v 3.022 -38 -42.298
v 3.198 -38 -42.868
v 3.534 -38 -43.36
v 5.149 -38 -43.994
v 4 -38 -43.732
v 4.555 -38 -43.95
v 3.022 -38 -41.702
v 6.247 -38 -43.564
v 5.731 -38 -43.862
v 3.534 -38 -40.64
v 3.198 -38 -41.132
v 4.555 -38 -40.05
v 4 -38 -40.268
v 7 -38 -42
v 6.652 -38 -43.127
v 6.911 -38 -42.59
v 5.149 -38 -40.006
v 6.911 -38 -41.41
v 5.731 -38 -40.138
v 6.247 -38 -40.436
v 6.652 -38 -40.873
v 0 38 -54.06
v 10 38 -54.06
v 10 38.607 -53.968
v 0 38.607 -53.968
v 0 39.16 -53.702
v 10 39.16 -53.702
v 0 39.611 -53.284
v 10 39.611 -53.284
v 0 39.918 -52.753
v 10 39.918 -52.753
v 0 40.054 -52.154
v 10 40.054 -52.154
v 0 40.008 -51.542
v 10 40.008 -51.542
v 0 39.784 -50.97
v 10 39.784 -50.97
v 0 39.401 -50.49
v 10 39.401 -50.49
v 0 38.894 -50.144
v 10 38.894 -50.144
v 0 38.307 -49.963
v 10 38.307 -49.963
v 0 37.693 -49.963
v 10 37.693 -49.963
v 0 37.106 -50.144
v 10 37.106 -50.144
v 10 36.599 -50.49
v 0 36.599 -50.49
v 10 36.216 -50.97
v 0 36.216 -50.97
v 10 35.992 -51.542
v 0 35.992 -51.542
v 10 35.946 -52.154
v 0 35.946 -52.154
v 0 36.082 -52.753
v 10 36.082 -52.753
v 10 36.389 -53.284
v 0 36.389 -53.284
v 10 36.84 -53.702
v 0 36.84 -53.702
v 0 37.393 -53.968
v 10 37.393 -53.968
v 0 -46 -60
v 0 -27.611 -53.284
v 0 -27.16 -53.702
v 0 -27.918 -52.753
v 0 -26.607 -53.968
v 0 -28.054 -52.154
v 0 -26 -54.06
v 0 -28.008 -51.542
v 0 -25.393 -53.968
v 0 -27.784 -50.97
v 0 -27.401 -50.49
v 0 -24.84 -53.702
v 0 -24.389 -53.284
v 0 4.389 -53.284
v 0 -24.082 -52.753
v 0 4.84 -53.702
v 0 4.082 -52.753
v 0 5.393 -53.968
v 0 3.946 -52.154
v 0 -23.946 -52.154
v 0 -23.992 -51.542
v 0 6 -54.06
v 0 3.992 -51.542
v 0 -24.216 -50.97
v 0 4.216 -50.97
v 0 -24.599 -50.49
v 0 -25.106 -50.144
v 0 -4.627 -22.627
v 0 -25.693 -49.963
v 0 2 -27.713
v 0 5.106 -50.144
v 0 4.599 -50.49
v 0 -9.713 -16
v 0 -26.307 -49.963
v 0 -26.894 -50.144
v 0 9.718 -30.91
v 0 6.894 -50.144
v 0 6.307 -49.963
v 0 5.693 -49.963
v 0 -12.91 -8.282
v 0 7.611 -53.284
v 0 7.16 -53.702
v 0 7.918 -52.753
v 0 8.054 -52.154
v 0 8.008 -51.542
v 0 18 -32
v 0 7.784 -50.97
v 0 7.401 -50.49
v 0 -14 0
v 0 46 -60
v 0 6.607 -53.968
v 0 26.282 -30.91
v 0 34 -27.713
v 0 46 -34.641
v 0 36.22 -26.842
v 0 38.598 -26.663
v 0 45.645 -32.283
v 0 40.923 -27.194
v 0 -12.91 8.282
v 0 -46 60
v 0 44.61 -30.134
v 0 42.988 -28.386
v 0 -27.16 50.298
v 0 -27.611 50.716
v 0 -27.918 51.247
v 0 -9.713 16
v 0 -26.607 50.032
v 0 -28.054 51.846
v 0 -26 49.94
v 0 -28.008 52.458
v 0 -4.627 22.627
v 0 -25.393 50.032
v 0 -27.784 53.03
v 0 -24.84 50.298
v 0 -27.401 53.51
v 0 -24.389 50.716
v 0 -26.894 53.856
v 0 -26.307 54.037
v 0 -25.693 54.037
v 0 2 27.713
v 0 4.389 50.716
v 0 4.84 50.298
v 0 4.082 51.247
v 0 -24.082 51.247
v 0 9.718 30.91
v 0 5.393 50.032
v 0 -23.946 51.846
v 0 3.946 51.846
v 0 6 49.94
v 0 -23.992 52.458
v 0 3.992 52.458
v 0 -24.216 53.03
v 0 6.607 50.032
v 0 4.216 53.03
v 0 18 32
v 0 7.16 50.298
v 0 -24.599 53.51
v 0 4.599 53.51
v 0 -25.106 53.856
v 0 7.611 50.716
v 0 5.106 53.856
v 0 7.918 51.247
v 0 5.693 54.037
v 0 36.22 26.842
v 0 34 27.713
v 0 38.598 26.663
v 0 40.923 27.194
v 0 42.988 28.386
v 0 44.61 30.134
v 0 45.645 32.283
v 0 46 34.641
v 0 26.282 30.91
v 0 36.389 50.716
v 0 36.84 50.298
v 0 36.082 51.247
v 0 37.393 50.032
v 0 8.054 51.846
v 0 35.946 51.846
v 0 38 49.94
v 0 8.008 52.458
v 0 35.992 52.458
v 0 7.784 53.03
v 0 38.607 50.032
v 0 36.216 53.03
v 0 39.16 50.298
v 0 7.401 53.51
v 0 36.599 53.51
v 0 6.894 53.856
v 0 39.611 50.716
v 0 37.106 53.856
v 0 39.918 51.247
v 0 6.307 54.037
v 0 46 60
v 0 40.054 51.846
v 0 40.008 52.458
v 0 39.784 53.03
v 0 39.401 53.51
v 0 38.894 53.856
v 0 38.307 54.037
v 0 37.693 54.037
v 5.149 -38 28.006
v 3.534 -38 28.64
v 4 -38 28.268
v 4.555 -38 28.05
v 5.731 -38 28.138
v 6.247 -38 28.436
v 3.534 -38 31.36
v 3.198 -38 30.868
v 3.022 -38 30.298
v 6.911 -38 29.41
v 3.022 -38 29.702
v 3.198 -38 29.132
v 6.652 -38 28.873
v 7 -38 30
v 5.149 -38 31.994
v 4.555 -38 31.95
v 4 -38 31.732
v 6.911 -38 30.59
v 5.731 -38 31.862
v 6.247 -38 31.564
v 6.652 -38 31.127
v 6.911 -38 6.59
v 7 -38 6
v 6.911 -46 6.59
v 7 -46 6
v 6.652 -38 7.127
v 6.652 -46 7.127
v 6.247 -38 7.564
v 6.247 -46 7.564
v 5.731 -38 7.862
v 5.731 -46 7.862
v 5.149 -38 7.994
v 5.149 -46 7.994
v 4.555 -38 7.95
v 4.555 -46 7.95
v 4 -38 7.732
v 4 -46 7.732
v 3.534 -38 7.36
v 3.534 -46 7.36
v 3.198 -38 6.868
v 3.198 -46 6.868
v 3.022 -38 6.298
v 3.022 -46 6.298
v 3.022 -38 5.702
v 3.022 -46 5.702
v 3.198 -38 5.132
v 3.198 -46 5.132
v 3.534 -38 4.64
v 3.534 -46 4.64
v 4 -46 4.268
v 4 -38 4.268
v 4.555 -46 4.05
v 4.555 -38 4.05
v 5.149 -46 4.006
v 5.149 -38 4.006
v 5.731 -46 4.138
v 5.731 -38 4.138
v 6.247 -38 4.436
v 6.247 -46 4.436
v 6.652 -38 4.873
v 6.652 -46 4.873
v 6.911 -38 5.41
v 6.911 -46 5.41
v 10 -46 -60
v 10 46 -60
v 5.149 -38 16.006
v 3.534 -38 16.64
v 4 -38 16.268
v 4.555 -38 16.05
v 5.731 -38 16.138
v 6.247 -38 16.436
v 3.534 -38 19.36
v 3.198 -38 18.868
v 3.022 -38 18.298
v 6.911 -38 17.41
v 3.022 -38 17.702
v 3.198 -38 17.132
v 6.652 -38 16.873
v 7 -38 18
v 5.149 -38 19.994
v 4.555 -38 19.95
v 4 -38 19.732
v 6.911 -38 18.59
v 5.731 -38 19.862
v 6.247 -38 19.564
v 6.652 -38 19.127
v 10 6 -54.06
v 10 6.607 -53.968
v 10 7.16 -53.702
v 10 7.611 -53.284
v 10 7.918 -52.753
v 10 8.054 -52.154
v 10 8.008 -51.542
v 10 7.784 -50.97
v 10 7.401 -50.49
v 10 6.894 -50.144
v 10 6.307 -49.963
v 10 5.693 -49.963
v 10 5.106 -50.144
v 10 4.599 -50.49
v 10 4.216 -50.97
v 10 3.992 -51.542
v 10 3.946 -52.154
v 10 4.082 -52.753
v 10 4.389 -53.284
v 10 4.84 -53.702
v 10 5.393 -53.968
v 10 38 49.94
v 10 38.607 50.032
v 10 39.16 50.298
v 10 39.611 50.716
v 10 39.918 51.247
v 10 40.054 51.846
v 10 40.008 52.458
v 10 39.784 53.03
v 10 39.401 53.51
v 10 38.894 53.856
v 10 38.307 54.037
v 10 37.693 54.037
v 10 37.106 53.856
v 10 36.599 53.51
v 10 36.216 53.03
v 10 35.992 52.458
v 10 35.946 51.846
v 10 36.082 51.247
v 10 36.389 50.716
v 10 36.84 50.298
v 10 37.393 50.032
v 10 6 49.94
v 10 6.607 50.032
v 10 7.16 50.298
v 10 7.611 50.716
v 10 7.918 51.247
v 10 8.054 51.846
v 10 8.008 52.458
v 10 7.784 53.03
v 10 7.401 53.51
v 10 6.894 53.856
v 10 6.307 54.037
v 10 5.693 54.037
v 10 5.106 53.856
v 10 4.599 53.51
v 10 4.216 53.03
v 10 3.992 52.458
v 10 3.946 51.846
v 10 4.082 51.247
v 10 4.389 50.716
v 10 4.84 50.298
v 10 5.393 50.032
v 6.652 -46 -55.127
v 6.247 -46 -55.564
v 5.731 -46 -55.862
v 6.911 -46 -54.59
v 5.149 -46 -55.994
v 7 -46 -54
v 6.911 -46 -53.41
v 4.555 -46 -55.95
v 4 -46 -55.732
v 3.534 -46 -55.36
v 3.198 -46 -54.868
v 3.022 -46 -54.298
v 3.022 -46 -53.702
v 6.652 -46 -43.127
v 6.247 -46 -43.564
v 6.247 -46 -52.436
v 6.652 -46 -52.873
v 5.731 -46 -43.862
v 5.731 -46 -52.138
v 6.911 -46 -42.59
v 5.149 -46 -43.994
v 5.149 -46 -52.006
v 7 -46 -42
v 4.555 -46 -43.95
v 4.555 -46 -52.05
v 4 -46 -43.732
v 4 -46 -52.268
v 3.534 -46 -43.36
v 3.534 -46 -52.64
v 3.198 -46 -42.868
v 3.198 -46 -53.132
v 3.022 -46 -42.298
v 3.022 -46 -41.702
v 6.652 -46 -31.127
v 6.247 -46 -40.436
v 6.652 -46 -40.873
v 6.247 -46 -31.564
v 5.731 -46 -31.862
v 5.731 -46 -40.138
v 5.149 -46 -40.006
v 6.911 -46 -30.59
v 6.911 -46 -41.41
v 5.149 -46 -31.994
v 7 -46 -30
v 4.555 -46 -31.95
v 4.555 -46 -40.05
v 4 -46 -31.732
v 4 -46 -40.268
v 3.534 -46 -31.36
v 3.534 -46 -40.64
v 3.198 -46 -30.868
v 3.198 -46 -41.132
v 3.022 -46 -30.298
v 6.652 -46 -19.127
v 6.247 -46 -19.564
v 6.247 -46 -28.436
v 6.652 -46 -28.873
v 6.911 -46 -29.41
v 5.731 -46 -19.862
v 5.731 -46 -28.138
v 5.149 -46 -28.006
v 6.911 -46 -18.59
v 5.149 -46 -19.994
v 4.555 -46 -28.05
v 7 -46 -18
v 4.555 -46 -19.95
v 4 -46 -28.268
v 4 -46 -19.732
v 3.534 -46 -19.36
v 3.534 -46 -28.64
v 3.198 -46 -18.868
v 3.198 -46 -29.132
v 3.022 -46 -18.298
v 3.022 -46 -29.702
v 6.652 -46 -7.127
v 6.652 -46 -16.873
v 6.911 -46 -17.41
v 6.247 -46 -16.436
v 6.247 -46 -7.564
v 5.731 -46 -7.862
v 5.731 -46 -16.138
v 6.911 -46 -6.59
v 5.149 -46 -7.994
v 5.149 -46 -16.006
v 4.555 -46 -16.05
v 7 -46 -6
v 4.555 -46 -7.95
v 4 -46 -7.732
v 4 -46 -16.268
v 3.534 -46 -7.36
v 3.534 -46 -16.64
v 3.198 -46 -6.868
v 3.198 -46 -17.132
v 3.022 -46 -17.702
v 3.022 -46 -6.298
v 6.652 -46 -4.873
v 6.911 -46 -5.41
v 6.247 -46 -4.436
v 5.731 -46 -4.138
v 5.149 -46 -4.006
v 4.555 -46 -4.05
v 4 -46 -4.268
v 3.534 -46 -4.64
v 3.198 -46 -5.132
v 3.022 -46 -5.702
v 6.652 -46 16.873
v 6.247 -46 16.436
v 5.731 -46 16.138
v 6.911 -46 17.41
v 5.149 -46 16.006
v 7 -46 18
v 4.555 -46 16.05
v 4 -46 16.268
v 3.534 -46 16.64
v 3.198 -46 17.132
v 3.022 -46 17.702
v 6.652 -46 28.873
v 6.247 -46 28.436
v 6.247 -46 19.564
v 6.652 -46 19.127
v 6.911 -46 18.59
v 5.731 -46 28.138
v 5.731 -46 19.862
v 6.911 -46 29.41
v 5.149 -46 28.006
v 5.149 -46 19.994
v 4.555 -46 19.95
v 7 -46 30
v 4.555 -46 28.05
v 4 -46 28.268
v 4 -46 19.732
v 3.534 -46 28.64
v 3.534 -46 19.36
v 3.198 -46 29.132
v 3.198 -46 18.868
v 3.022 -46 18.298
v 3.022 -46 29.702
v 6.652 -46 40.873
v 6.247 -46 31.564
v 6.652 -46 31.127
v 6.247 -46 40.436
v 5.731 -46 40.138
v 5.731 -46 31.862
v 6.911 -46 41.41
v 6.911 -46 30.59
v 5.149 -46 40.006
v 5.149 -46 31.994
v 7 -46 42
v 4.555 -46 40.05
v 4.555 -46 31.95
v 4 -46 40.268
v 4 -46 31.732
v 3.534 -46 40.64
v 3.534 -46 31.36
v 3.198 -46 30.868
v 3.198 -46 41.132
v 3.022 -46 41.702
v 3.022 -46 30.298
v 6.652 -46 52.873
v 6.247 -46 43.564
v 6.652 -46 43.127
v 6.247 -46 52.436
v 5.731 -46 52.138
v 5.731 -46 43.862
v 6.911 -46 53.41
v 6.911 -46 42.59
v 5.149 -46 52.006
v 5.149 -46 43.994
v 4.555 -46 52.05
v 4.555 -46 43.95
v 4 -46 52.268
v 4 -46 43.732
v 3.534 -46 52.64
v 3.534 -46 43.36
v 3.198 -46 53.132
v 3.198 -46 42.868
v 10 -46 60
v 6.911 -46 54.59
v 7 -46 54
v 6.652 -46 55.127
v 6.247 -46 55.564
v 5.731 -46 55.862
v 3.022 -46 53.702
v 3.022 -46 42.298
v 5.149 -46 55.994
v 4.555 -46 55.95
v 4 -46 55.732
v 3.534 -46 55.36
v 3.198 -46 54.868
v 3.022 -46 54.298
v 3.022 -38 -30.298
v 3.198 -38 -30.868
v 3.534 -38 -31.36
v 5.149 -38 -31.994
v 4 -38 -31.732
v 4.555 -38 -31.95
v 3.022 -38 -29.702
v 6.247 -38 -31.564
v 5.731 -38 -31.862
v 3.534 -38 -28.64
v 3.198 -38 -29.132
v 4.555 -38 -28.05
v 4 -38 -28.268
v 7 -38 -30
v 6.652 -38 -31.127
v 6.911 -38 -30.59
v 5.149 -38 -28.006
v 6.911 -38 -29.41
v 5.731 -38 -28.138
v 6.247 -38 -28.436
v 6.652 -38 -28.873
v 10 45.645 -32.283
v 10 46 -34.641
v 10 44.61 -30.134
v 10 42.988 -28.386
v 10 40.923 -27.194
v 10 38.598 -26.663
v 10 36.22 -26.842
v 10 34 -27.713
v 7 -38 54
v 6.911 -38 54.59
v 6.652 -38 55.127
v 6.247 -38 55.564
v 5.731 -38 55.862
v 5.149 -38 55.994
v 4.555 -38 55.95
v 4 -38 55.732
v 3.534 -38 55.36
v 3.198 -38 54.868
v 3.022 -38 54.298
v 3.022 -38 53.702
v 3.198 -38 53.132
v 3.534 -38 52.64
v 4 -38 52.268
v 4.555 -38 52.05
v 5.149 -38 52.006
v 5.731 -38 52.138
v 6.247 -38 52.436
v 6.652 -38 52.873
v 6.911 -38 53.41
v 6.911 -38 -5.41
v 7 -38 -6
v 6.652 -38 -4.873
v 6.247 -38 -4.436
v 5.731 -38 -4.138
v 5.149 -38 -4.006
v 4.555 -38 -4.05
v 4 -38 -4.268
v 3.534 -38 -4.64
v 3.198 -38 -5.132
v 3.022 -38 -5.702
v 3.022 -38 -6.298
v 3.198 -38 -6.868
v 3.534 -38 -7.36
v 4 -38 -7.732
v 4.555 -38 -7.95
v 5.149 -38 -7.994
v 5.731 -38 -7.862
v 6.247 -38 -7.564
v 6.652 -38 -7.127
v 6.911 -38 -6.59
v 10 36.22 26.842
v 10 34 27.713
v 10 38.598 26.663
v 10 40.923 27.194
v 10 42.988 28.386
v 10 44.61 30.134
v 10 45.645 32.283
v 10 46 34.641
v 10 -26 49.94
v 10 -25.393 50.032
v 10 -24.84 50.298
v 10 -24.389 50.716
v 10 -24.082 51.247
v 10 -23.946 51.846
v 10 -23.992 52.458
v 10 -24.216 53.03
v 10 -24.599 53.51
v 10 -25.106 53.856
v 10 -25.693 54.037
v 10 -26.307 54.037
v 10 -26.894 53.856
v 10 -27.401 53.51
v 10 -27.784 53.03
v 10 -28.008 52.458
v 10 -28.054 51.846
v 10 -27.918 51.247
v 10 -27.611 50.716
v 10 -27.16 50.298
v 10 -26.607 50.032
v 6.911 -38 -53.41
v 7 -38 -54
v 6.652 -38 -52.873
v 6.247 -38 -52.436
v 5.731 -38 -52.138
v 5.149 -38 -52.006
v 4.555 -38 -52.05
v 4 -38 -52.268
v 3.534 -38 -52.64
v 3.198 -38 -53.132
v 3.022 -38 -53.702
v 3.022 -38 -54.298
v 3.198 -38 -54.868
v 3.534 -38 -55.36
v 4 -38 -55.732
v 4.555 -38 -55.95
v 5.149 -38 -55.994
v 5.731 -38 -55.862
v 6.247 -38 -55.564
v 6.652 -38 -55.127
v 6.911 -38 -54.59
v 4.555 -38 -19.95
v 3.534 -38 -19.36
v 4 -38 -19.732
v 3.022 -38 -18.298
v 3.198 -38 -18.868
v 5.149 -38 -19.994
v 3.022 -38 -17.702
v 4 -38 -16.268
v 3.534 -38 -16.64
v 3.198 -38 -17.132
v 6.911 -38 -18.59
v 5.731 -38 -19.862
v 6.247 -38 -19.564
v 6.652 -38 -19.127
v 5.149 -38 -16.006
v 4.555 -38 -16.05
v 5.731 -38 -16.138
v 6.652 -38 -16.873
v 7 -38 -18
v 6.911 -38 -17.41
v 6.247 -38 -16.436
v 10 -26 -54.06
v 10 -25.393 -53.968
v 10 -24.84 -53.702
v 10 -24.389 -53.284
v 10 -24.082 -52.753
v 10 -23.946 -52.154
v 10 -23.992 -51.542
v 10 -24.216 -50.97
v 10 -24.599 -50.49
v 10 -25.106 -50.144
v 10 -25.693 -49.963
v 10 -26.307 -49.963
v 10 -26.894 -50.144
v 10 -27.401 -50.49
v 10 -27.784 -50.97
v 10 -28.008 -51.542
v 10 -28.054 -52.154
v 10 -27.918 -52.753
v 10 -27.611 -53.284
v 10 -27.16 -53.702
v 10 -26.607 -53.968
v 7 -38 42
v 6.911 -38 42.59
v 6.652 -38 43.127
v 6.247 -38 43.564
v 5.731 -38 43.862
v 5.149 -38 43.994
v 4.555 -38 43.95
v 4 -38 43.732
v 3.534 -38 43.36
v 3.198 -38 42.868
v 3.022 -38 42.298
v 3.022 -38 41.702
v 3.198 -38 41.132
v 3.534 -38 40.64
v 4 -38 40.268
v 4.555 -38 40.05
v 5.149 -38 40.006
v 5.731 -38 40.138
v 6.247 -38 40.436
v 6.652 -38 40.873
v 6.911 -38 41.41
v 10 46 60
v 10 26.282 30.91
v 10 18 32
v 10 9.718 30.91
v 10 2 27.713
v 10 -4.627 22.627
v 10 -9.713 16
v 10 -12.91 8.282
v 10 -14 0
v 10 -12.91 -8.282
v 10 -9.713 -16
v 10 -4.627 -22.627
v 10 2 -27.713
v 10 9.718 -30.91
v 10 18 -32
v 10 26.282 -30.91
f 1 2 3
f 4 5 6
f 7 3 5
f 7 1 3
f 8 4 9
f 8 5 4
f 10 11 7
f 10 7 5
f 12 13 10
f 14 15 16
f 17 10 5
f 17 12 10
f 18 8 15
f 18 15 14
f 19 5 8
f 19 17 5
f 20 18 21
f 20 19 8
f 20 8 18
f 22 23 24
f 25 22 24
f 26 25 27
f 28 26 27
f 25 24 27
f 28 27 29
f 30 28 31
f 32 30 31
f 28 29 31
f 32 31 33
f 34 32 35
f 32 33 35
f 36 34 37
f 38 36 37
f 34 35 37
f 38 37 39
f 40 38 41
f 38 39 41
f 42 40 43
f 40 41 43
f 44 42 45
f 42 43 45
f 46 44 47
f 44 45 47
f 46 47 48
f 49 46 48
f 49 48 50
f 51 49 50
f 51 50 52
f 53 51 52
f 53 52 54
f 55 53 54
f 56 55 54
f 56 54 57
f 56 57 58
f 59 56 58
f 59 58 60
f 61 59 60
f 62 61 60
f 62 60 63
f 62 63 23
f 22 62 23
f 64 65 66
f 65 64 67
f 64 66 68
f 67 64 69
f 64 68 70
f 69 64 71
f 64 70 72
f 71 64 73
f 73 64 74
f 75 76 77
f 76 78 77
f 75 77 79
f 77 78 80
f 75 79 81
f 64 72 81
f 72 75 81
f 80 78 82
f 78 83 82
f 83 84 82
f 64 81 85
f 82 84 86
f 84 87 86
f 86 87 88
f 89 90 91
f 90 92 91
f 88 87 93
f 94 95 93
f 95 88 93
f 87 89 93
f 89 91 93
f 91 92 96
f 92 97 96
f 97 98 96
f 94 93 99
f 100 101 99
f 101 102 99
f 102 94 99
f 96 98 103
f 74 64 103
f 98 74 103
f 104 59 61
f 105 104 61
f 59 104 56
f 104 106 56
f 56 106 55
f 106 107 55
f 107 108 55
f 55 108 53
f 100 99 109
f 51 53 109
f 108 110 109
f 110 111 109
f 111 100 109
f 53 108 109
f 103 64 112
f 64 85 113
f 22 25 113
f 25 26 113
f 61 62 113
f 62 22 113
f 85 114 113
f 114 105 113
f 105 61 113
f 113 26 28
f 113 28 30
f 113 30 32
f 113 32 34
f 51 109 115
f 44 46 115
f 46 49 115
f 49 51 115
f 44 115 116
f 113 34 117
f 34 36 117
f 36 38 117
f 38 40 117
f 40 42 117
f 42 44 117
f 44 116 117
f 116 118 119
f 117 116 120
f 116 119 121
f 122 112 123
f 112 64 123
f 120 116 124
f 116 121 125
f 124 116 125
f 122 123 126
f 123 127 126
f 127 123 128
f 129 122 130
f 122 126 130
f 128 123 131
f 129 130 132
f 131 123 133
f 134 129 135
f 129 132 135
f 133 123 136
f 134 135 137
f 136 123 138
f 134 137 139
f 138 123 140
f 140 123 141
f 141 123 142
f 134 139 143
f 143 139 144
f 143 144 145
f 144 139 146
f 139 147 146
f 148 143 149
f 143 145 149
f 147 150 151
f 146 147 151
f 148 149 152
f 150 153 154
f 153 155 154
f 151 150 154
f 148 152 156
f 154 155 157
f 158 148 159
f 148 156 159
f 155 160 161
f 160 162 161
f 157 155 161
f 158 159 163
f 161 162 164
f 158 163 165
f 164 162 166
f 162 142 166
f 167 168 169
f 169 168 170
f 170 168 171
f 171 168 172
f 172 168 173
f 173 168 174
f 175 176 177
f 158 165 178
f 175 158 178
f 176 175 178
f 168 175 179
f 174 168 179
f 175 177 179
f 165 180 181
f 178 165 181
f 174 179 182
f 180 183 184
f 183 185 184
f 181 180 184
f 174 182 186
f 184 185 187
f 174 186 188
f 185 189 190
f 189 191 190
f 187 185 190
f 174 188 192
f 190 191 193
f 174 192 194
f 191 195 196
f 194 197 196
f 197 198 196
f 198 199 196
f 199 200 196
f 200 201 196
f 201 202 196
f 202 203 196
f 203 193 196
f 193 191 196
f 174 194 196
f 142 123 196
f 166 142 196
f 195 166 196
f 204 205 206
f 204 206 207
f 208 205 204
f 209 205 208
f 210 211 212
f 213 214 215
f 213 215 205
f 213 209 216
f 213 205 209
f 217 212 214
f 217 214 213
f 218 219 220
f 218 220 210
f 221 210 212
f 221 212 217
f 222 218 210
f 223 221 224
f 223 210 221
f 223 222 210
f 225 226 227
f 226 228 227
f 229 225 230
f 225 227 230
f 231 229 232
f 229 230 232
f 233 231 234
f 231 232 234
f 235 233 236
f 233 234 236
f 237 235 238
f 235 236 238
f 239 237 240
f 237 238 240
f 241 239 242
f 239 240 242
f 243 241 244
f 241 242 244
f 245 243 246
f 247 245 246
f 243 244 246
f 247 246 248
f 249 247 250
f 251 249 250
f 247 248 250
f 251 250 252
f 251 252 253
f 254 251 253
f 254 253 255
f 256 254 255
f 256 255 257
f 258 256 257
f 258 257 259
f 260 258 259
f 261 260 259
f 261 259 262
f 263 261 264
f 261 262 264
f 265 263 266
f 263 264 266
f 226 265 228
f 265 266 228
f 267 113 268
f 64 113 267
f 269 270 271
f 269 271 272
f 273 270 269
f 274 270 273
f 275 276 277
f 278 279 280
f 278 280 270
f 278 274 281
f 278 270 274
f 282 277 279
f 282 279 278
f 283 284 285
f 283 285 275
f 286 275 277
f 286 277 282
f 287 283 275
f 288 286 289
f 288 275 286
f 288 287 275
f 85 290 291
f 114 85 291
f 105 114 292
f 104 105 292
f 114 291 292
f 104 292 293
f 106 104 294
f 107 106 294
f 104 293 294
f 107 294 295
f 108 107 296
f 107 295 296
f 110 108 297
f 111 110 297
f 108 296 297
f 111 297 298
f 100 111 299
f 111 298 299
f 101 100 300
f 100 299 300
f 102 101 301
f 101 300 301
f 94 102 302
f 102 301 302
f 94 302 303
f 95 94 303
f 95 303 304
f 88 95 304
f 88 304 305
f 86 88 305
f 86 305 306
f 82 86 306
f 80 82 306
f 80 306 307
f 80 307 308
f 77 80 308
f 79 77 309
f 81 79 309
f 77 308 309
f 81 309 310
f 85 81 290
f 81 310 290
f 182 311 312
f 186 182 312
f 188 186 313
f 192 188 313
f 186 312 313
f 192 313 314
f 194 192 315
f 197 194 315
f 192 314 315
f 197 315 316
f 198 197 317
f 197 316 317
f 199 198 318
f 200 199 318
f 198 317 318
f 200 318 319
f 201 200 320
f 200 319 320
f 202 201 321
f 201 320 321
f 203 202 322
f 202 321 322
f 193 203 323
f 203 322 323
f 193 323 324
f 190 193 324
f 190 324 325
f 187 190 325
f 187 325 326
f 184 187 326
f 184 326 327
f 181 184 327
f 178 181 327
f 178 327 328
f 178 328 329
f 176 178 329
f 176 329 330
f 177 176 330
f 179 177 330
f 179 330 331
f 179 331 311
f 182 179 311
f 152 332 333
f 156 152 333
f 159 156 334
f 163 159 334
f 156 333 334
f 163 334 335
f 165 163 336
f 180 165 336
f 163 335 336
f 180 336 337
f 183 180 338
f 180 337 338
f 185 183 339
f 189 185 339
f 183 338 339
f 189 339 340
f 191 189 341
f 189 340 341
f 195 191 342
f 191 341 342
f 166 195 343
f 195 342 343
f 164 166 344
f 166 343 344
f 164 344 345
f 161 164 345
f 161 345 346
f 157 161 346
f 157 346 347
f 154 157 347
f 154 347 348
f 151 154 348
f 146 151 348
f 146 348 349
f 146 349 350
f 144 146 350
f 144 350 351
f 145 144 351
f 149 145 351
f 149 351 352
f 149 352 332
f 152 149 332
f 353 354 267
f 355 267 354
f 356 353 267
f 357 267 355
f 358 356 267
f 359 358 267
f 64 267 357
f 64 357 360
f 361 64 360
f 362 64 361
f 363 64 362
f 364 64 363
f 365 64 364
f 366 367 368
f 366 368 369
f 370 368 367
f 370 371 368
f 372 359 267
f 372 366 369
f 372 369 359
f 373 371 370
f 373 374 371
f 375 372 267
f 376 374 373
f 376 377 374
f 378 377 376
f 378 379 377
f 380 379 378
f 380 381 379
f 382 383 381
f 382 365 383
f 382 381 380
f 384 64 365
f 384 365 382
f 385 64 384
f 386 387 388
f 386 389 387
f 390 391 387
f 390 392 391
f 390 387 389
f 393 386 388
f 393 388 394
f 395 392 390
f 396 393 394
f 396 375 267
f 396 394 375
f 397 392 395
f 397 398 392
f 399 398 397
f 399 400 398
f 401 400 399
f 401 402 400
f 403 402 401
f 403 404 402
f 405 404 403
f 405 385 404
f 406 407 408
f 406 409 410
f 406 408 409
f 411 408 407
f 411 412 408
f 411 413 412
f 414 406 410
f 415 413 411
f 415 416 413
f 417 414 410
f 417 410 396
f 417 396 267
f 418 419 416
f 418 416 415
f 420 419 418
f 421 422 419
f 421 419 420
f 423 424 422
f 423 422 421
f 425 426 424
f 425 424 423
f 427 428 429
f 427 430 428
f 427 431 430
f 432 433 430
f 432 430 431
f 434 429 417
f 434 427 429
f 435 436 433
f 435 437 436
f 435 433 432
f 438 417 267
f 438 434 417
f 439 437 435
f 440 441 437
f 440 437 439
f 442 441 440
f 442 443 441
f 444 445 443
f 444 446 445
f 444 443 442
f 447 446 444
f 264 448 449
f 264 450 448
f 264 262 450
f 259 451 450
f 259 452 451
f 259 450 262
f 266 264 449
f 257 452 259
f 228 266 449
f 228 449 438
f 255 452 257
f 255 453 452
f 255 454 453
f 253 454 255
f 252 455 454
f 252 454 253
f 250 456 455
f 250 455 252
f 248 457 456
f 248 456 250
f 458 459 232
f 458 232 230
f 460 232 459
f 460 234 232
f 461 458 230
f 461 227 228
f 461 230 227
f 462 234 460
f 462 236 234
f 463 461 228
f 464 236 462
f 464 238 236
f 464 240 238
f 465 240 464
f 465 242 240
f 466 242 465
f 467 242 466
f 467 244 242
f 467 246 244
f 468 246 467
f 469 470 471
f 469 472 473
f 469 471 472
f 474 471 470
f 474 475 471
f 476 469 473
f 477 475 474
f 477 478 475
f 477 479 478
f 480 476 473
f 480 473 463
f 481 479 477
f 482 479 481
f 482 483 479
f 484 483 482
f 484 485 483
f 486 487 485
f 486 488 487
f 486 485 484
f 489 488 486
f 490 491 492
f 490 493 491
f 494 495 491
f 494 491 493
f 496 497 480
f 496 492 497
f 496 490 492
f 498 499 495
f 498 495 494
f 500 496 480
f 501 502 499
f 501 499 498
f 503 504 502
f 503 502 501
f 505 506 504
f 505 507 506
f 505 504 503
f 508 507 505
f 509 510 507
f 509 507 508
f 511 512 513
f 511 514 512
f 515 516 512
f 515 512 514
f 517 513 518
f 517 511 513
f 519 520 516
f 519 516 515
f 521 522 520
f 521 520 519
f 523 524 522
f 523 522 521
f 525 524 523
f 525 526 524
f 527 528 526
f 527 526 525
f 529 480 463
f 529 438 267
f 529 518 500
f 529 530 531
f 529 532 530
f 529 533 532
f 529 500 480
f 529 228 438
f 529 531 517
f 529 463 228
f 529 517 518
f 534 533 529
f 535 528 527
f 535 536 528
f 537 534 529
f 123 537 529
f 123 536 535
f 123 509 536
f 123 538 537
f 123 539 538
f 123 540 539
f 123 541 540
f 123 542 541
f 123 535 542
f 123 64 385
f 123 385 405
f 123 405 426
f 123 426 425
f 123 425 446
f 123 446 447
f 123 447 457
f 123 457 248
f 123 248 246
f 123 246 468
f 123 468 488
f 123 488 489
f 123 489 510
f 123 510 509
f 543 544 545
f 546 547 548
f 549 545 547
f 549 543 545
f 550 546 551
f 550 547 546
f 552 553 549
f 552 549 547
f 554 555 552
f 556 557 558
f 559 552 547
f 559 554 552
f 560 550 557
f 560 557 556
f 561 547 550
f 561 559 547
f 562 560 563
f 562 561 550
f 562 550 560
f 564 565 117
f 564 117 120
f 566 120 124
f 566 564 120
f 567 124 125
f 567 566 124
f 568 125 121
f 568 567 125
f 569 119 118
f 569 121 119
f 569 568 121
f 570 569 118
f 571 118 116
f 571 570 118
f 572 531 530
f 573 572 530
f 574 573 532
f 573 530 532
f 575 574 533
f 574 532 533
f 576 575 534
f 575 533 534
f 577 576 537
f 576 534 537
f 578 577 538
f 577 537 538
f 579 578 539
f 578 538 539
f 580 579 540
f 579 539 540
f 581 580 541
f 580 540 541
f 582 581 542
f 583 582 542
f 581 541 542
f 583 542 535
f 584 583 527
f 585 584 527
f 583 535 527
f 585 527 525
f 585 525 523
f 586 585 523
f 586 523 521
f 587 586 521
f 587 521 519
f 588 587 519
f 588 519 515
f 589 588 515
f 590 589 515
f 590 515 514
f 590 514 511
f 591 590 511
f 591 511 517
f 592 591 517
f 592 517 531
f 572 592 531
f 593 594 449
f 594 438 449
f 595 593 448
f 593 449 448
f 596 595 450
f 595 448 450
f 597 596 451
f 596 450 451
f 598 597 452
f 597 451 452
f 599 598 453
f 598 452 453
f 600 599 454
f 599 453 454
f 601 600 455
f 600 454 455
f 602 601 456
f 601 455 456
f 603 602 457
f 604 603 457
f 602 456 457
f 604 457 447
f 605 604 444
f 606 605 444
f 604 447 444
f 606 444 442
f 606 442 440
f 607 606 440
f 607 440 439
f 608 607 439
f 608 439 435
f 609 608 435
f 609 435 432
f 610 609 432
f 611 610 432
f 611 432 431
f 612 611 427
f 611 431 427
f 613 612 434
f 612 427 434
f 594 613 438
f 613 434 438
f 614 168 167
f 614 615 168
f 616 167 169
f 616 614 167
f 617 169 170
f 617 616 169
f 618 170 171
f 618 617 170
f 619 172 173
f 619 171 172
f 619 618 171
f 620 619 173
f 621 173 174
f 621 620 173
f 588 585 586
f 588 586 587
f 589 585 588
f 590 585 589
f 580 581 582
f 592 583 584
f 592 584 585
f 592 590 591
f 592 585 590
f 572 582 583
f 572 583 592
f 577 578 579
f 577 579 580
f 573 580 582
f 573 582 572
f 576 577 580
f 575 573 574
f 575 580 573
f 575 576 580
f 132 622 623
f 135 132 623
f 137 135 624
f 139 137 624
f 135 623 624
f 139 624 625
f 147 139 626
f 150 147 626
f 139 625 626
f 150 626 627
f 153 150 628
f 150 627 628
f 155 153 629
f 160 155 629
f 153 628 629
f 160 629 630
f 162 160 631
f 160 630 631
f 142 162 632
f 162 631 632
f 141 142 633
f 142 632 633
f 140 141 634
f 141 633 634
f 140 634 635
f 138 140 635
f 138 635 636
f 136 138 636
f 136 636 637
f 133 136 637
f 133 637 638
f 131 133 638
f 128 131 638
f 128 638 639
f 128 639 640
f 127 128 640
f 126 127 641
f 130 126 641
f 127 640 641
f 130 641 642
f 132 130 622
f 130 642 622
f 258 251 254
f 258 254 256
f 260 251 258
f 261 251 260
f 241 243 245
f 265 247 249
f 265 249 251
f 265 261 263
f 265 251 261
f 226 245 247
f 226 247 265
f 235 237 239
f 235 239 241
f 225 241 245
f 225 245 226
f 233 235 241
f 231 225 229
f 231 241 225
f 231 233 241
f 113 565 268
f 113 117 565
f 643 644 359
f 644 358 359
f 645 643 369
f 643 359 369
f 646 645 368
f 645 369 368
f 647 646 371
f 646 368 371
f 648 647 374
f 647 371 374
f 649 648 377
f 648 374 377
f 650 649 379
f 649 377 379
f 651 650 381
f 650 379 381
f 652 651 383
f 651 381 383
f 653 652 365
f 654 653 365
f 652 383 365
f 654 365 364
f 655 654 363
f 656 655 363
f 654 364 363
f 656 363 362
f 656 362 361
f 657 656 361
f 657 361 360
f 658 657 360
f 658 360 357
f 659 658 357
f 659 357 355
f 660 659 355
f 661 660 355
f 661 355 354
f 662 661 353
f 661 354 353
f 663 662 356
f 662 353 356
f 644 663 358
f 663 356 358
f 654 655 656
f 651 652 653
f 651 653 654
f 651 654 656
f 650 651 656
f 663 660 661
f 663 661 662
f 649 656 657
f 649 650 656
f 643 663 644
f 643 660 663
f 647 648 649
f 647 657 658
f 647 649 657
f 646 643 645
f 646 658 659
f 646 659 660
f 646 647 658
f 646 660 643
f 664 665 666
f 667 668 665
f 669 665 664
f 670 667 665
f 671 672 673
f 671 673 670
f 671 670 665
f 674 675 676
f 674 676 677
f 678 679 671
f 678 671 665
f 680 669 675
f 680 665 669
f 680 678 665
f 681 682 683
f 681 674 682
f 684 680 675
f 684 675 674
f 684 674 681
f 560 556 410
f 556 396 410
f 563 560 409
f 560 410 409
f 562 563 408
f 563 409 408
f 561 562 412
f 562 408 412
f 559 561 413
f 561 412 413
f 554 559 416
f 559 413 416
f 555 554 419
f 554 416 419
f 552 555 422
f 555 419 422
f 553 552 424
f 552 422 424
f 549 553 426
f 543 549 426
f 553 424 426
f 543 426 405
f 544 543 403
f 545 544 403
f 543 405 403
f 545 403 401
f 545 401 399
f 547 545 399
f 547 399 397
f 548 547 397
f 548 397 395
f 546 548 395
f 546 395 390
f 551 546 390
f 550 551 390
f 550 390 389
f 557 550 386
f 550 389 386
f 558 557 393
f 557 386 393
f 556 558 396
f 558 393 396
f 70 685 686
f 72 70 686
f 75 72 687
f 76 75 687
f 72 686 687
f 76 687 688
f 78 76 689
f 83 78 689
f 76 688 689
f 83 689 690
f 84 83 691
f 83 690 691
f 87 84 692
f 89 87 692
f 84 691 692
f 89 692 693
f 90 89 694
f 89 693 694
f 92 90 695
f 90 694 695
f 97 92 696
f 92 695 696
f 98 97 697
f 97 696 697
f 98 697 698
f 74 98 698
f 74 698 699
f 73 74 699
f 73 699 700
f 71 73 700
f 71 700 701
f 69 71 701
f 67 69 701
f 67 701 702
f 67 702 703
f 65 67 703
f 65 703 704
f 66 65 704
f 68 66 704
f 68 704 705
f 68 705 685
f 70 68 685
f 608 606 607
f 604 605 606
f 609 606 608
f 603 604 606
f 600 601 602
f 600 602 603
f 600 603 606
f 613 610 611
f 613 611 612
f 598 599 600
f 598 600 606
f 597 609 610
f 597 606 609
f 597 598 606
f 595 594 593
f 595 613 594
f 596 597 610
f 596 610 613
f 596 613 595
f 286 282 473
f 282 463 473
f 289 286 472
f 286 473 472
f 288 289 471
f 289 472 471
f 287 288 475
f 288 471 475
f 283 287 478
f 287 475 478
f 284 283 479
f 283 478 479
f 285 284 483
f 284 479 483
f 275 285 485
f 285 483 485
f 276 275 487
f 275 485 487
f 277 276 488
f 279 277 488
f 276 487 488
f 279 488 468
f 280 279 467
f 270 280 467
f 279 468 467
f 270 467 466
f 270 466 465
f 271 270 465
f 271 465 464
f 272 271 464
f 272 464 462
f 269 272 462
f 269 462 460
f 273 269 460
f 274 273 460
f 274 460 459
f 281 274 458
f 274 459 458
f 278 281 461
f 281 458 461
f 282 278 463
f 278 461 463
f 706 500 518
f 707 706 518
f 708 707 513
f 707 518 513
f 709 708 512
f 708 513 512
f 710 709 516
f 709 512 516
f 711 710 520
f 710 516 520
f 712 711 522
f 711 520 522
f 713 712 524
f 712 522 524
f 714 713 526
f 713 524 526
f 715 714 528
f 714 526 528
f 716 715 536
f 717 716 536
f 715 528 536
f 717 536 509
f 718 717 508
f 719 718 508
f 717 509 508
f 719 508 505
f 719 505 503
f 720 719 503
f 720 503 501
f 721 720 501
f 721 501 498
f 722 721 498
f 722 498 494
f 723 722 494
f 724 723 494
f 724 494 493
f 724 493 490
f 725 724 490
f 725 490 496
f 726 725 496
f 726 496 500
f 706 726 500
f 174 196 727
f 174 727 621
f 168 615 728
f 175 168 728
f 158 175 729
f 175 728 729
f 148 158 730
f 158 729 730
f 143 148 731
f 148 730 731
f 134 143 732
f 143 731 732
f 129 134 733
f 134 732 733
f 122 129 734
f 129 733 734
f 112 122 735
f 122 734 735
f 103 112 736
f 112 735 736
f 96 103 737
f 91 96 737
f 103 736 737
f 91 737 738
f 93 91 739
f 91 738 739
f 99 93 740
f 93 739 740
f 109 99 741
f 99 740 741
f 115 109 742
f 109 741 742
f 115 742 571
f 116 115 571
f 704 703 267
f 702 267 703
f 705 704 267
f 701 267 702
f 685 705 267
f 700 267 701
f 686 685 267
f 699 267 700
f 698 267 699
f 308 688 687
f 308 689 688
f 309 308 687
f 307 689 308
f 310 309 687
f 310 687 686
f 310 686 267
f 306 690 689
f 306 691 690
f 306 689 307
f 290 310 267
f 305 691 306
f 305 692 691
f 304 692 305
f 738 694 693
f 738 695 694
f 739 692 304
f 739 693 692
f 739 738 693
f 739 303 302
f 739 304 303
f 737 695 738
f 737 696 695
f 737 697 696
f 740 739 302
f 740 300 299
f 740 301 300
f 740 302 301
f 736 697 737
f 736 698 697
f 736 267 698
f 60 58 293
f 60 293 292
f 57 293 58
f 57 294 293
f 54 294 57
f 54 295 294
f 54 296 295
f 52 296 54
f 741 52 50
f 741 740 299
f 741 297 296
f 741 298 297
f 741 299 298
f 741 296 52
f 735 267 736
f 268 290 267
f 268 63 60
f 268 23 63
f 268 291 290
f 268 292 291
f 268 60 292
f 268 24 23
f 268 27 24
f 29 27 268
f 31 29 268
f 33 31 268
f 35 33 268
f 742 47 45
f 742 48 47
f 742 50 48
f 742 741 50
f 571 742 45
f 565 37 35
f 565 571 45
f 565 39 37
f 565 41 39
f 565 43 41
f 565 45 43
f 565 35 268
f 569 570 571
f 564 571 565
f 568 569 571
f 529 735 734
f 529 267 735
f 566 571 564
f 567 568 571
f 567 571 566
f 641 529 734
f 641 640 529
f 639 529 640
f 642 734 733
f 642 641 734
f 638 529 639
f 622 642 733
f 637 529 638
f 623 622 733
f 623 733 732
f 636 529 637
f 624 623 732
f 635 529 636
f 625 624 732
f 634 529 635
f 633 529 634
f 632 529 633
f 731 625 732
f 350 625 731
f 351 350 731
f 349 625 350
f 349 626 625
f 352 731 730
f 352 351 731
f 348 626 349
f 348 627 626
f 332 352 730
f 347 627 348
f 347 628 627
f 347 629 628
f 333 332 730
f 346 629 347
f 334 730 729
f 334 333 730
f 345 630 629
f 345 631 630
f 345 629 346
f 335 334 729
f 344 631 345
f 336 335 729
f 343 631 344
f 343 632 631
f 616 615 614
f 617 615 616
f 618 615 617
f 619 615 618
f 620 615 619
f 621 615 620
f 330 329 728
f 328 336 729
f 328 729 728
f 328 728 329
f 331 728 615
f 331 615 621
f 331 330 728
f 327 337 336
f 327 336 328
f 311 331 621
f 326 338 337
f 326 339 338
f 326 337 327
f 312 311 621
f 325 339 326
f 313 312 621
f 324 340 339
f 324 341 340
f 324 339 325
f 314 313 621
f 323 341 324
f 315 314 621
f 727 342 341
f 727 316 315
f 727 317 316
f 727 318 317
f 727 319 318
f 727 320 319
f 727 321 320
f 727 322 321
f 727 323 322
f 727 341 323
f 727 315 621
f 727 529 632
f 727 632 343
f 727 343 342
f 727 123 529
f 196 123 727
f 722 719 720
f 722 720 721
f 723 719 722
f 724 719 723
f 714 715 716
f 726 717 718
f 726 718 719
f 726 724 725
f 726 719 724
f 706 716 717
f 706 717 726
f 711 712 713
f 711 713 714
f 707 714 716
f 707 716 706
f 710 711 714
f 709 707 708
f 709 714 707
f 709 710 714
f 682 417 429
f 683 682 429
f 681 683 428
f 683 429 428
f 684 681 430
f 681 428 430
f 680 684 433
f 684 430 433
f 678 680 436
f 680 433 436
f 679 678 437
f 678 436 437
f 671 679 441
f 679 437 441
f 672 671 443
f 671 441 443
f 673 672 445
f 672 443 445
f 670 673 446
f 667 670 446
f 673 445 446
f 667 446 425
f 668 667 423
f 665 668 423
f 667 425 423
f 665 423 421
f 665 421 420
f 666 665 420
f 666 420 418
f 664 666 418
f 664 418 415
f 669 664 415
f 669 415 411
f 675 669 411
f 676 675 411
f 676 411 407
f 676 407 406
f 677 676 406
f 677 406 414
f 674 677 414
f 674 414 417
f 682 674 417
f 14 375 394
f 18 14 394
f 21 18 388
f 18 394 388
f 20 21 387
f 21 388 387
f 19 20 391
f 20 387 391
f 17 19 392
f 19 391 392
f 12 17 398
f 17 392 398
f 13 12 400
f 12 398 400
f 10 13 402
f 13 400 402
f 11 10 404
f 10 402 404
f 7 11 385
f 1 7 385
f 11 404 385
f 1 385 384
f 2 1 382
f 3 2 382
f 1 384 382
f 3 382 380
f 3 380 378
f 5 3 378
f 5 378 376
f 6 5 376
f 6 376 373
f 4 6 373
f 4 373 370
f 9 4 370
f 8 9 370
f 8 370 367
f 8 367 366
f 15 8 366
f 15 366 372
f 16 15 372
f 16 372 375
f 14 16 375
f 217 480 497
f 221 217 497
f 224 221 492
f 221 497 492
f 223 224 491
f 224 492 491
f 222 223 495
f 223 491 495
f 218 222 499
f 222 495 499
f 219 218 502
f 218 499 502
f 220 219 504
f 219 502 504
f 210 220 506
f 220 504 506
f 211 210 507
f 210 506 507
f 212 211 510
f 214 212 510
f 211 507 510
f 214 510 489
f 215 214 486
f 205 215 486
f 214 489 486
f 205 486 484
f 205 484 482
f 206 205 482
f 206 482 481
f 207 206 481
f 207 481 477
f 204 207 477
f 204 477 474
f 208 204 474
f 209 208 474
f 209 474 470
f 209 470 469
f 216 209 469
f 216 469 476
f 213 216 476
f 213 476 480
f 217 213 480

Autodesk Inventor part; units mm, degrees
ref_plane "YZ Plane" through (0, 0, 0) normal (1, 0, 0) x (0, 1, 0)
ref_plane "XZ Plane" through (0, 0, 0) normal (0, 1, 0) x (-1, 0, 0)
ref_plane "XY Plane" through (0, 0, 0) normal (0, 0, 1) x (1, 0, 0)
sketch "Sketch1" plane through (0, 0, 0) normal (1, 0, 0) x (0, 1, 0)
  line L0 (-46, 60) -> (46, 60)
  line L1 (46, 60) -> (46, -60)
  line L2 (46, -60) -> (-46, -60)
  line L3 (-46, -60) -> (-46, 60)
  line L4 (-46, 60) -> (46, -60) construction
  line L5 (46, 60) -> (-46, -60) construction
  point P0 (0, 0)
  dimension "d0" = 92
  dimension "d1" = 120
extrude "Extrusion1" add sketch "Sketch1" along normal blind 10
sketch "Sketch3" plane through (10, 0, 0) normal (1, 0, 0) x (0, 0, -1)
  circle A0 centre (0, 18) radius 32
  line L0 (-60, -46) -> (60, -46) projected
  point P0 (0, 0)
  point P1 (0, -46)
  dimension "d16" = 64
  dimension "d17" = 64
extrude "Extrusion3" cut sketch "Sketch3" against normal through all
fillet "Fillet1" radius 8 2 edges at (5, 46, 15.4919) (5, 46, -15.4919)
sketch "Sketch6" plane through (0, -46, -60) normal (0, -1, 0) x (1, 0, 0)
  circle A0 centre (5, 114) radius 2
  line L0 (10, 120) -> (10, 0) construction
  circle A1 centre (5, 102) radius 2
  circle A2 centre (5, 90) radius 2
  circle A3 centre (5, 78) radius 2
  circle A4 centre (5, 66) radius 2
  circle A5 centre (5, 54) radius 2
  circle A6 centre (5, 42) radius 2
  circle A7 centre (5, 30) radius 2
  circle A8 centre (5, 18) radius 2
  circle A9 centre (5, 6) radius 2
  line L1 (5, 66) -> (5, 54) construction
  line L2 (0, 120) -> (0, 0) projected
  line L3 (0, 120) -> (10, 120) projected
  point P0 (0, 60)
  point P1 (5, 60)
  point P2 (0, 60)
  point P3 (5, 120)
  dimension "d66" = 4
  dimension "d69" = 12
extrude "Extrusion6" cut sketch "Sketch6" against normal blind 8
sketch "Sketch7" plane through (10, 0, 0) normal (1, 0, 0) x (0, 0, -1)
  circle A0 centre (-52, 38) radius 2.06
  line L0 (-34.641, 46) -> (-60, 46) construction
  line L1 (-60, 46) -> (-60, -46) construction
  line L2 (60, 46) -> (34.641, 46) construction
  line L3 (60, -46) -> (60, 46) construction
  line L4 (-60, -46) -> (60, -46) projected
  line L5 (0, 0) -> (0, -46) construction
  circle A1 centre (52, 38) radius 2.06
  circle A2 centre (-52, 6) radius 2.06
  circle A3 centre (-52, -26) radius 2.06
  circle A4 centre (52, 6) radius 2.06
  circle A5 centre (52, -26) radius 2.06
  dimension "d76" = 4.12
  dimension "d78" = 8
  dimension "d84" = 84
  dimension "d87" = 32
extrude "Extrusion7" cut sketch "Sketch7" against normal through all
properties part number "FirstStageMotorSupportPlate" material "Aluminum 6061"
